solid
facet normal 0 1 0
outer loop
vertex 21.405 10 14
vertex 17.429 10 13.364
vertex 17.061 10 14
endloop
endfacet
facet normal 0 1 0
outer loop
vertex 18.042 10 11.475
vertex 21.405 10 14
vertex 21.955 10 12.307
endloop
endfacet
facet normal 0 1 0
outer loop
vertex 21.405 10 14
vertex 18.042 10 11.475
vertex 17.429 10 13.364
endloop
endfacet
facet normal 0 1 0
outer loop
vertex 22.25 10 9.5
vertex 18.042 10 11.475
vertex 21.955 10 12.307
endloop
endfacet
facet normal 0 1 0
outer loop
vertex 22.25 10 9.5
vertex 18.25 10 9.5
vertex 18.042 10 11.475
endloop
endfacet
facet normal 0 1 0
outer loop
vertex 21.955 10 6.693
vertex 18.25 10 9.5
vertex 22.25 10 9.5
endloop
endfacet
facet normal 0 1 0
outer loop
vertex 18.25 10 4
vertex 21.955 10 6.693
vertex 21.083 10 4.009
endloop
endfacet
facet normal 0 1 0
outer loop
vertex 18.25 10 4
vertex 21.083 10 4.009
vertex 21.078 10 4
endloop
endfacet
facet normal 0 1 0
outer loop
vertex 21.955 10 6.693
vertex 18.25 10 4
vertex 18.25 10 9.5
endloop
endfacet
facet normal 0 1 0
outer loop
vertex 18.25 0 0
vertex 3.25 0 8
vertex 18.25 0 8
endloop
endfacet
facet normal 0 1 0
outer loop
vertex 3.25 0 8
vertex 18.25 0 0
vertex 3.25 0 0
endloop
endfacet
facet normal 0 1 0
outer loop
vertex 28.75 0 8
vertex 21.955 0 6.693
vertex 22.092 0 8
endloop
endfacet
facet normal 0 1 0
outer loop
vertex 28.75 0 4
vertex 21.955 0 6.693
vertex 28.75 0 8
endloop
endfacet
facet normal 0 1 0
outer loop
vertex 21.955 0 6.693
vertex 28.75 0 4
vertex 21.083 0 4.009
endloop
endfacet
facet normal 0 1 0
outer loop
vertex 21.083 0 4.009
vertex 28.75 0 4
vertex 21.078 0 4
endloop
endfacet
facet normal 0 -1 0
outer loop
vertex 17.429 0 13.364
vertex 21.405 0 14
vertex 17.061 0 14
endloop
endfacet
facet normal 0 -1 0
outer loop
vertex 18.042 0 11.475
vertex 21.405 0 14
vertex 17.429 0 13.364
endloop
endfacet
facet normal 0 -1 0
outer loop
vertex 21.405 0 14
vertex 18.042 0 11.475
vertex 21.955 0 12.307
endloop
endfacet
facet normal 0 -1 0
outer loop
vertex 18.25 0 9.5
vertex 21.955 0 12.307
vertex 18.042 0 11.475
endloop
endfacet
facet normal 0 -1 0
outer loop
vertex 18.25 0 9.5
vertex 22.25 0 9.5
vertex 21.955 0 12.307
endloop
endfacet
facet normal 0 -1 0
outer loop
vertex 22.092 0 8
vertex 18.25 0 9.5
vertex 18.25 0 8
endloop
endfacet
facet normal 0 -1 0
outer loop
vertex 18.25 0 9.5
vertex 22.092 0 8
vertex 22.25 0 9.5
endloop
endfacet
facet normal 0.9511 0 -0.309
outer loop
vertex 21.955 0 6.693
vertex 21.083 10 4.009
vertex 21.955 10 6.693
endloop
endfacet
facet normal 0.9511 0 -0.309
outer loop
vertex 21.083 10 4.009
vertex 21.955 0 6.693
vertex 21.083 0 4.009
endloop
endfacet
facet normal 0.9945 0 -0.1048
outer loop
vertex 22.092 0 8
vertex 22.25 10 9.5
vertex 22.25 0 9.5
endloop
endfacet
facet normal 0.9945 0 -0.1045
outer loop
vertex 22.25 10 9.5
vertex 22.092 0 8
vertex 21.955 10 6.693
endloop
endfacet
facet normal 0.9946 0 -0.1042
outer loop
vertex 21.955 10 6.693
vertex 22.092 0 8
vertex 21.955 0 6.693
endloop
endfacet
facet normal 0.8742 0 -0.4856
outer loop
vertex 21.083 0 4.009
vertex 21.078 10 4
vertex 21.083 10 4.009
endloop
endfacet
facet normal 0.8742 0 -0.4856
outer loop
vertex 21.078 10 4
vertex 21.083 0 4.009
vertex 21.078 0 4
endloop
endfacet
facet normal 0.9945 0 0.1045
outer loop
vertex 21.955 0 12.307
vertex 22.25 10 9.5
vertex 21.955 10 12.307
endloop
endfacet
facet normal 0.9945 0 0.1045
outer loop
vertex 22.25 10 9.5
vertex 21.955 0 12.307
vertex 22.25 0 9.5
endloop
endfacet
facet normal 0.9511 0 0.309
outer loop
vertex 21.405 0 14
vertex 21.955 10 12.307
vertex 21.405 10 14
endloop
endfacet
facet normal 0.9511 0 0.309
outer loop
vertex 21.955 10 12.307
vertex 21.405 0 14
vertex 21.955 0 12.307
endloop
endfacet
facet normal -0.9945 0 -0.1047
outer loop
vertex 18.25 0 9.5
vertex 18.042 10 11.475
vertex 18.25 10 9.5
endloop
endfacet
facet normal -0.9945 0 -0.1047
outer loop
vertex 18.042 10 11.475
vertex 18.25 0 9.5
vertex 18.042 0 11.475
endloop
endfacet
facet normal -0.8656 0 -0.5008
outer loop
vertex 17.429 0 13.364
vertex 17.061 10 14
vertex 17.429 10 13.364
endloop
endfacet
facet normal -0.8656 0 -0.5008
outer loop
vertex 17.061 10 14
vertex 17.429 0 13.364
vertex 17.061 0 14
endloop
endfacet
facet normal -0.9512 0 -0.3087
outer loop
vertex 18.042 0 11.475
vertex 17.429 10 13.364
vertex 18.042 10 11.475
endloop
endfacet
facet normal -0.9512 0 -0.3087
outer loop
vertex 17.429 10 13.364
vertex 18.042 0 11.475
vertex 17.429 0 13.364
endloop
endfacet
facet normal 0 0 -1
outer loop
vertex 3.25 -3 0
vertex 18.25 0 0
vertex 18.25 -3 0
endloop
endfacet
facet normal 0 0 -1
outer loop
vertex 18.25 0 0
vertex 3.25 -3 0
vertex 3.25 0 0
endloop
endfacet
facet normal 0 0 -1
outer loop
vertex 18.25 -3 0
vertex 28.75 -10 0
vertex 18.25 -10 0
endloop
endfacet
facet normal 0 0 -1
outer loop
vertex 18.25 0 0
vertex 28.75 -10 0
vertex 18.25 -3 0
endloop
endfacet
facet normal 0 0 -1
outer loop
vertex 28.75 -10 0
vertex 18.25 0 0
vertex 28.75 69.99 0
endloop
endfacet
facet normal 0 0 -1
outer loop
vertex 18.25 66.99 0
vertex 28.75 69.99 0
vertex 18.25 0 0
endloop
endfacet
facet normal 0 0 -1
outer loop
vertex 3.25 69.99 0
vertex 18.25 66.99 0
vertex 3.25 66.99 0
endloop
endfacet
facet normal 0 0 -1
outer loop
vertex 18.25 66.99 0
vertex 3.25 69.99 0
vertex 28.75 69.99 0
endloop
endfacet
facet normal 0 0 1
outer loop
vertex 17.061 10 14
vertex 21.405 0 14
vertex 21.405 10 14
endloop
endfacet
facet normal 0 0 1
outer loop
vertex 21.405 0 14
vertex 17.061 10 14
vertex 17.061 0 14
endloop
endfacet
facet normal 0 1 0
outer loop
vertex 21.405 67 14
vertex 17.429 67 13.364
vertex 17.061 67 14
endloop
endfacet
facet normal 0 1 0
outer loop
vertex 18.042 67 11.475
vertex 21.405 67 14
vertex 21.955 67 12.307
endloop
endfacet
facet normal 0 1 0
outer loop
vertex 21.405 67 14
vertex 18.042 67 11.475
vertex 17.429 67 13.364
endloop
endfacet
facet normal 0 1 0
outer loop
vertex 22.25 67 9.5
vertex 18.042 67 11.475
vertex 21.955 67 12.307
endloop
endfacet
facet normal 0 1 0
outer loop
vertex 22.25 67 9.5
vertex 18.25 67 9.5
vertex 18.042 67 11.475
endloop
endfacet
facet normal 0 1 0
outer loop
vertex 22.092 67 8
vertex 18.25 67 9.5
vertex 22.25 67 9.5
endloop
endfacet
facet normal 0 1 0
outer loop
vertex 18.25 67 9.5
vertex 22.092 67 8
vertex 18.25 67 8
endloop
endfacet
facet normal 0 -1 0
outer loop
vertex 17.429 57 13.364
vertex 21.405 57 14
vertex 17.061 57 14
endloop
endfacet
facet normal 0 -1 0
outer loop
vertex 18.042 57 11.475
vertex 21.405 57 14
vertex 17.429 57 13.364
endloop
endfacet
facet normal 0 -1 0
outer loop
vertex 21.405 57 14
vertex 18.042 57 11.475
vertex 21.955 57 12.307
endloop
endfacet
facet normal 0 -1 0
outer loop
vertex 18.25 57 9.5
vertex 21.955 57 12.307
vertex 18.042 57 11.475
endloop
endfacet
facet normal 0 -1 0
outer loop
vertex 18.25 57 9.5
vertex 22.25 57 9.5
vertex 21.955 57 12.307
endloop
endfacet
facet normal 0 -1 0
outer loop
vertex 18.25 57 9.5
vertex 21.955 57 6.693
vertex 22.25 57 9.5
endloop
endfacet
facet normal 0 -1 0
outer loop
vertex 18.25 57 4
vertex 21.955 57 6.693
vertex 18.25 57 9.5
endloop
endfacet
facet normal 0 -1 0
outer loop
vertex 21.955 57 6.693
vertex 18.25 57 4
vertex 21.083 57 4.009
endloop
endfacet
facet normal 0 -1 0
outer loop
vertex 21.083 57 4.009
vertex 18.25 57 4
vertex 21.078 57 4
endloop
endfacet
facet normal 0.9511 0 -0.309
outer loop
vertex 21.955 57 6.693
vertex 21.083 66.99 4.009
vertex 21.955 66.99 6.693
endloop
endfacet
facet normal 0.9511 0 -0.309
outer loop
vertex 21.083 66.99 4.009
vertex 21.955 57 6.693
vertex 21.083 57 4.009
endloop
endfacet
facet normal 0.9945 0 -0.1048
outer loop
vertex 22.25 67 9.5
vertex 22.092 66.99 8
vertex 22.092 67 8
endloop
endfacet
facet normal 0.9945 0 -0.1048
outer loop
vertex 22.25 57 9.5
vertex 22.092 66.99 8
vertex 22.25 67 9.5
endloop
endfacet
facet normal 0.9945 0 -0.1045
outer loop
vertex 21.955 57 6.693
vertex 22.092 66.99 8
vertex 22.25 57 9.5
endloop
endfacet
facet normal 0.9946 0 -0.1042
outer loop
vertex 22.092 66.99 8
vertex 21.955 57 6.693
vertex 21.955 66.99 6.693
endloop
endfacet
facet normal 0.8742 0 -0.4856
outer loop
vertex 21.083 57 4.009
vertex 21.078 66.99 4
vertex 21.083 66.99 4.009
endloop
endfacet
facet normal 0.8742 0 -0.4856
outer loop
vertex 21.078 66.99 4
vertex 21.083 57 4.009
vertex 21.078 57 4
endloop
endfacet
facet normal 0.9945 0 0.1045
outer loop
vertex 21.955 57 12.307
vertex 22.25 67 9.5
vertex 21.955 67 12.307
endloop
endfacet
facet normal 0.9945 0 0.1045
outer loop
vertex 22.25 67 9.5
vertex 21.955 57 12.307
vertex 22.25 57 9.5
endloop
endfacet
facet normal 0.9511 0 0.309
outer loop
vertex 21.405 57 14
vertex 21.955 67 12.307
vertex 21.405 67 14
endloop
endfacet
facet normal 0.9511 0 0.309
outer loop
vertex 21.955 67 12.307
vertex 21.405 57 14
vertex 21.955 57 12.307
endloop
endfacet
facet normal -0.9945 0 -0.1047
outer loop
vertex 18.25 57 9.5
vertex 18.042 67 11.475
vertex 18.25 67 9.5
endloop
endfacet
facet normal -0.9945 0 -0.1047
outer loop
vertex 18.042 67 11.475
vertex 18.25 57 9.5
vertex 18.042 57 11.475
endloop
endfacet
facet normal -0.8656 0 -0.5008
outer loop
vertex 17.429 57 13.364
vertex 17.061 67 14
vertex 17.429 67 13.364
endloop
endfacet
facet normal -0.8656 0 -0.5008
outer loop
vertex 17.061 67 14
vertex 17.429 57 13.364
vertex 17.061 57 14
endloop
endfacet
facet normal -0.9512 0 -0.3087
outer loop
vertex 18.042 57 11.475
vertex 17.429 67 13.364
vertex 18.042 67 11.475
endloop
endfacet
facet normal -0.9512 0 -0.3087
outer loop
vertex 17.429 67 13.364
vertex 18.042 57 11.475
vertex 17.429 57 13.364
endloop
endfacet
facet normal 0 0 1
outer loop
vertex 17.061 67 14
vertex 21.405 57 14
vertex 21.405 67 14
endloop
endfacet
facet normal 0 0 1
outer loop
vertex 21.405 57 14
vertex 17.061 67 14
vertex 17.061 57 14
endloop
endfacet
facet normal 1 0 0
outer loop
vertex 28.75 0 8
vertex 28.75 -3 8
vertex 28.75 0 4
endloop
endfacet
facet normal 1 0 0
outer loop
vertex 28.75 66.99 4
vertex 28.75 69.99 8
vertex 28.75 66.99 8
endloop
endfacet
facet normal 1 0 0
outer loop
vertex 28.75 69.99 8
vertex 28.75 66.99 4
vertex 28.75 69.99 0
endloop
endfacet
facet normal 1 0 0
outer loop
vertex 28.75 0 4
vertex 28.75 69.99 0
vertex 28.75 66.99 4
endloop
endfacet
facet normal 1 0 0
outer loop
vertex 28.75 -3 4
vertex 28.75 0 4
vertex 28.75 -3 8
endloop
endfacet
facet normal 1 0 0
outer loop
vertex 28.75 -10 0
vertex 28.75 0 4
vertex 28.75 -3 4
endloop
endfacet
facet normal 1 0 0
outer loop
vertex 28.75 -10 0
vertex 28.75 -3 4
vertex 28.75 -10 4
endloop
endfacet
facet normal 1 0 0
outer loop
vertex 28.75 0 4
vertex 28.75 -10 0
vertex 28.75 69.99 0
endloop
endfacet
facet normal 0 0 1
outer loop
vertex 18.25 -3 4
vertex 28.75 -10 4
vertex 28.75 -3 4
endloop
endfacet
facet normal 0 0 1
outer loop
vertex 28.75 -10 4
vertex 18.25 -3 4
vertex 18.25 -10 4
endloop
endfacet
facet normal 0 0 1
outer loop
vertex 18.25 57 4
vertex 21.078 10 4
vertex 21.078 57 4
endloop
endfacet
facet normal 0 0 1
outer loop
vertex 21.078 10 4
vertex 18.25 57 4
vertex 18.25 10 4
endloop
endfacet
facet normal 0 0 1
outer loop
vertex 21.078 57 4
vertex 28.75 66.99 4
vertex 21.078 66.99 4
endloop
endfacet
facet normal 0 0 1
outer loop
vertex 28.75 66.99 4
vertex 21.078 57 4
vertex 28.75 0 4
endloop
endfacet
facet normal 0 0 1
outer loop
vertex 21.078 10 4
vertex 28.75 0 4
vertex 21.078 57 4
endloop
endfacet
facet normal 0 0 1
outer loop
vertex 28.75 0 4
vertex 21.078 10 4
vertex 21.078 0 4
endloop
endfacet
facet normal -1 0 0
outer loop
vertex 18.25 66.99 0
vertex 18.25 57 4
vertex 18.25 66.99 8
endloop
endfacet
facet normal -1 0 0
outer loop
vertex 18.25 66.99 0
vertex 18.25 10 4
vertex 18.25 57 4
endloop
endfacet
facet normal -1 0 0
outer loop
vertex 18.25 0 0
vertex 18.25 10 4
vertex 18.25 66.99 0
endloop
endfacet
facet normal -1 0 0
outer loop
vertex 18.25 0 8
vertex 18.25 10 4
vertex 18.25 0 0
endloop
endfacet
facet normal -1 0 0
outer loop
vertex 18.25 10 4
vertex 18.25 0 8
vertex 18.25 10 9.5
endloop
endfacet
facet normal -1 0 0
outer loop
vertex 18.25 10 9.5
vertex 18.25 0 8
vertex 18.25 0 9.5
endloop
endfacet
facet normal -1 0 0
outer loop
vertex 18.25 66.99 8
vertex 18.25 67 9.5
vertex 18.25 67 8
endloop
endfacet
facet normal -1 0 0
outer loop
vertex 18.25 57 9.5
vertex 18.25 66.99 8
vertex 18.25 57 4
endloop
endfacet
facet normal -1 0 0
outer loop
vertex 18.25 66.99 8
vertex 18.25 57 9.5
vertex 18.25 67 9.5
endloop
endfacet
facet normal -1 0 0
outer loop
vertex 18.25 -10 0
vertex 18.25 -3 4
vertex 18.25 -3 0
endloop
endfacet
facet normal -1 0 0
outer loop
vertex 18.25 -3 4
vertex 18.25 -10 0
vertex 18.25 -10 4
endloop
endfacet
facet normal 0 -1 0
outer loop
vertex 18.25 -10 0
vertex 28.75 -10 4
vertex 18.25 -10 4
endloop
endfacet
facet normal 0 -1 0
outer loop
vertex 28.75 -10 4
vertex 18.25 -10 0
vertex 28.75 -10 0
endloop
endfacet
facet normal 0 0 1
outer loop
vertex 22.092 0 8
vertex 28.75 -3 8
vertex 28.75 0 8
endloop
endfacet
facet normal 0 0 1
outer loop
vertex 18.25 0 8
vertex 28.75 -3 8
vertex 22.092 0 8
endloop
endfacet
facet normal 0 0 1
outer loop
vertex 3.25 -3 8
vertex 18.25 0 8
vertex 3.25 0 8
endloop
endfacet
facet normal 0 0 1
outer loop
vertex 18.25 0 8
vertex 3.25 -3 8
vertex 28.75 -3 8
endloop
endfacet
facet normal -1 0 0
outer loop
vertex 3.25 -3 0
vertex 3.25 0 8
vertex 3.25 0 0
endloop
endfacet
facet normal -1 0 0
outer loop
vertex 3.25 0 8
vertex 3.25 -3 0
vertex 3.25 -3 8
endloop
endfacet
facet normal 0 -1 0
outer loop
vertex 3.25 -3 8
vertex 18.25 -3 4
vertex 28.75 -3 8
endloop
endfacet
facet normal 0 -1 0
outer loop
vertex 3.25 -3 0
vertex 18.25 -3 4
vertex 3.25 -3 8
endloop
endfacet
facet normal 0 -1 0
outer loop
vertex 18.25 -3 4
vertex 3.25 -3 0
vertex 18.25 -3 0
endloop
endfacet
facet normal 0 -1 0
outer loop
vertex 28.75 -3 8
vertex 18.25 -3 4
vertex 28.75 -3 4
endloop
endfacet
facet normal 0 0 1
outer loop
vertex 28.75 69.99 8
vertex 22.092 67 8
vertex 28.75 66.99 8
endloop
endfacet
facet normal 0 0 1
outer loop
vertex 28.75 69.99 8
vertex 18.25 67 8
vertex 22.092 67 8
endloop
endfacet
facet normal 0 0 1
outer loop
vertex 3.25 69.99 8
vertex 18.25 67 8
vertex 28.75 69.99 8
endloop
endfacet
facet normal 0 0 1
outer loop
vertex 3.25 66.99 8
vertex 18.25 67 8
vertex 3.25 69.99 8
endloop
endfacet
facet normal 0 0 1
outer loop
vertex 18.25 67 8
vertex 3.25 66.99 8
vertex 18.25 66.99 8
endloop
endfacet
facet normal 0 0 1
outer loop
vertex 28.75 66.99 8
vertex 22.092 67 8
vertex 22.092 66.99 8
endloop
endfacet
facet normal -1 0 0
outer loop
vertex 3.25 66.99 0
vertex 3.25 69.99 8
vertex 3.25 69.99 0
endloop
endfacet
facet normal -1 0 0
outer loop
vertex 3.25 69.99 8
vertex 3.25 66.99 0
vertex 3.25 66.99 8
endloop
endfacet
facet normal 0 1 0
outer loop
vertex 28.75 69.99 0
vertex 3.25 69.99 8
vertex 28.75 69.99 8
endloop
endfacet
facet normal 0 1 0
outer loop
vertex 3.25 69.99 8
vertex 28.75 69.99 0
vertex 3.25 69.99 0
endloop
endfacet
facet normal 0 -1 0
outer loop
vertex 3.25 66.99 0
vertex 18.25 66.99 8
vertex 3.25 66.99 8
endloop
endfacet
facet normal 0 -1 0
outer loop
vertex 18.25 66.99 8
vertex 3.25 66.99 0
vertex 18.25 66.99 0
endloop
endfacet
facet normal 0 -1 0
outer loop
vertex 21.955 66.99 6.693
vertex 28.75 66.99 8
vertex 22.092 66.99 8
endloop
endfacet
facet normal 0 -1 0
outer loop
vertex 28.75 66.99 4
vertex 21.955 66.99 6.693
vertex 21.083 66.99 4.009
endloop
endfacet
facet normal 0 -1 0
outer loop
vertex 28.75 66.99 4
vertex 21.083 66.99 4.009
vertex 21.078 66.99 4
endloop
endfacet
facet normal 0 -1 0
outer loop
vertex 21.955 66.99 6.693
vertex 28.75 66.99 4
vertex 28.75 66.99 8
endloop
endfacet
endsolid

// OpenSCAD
bat_h = 19;
bat_w = 37-0.5;
bat_l = 67;
bat_t = 4;
bat_b = 0;

batteryholder(15-4.5, 10);

module batteryholder(extend = 0, extendy = 0) {
   difference() {
   union() {
      batclam(10);
      translate([0, bat_l-10, 0])
         batclam(10);  
      translate([-bat_w/2, -extendy, 0])
         cube([bat_w+extend, bat_l+extendy, bat_b]);
      translate([+bat_w/2, -extendy, 0])
         cube([extend, bat_l+extendy, 4]);
      
   }
      translate([-bat_w, -extendy-1, -10])
         cube([bat_w+extend, bat_l+extendy+2, bat_h+20]);
      translate([-bat_w+bat_w/2, -1, -1])
         cube([bat_w, bat_l+2, bat_h/2+1]);
   }

   // stops at head and foot ofr battery
   translate([-15+bat_w/2, -3, 0])
      cube([extend+15, 3, 8]);
   translate([-15+bat_w/2, bat_l-0.01, 0])
      cube([extend+15, 3, 8]);
}

module batclam(l = 10) {
   difference() {
      translate([0, 0, -(bat_t-bat_b)])
         rounded(bat_w+2*bat_t, bat_h+2*bat_t, l);
      translate([0, -1, bat_b])
         rounded(bat_w, bat_h, l+2);
      translate([-(bat_w+15)/2, -2, bat_h+bat_b-5])
         cube([bat_w+15, l+4, 20]);
      translate([-(bat_w-bat_h+6)/2, -1, bat_h-bat_t-1])
         cube([bat_w-bat_h+6, l+2, 20]);
      translate([-(bat_w+4)/2, -2, -20])
         cube([bat_w+4, l+4, 20]);
   }
}



module rounded(w, h, l) {
   router = h/2;
   translate([0, 0, router])
   rotate([-90, 0,0 ]) {
      translate([-w/2+router, 0, 0])
         cylinder(r = router, h = l);
      translate([+w/2-router, 0, 0])
         cylinder(r = router, h = l);
      translate([-w/2+router, -router, 0])
         cube([w-2*router, 2*router, l]);
   }
}
